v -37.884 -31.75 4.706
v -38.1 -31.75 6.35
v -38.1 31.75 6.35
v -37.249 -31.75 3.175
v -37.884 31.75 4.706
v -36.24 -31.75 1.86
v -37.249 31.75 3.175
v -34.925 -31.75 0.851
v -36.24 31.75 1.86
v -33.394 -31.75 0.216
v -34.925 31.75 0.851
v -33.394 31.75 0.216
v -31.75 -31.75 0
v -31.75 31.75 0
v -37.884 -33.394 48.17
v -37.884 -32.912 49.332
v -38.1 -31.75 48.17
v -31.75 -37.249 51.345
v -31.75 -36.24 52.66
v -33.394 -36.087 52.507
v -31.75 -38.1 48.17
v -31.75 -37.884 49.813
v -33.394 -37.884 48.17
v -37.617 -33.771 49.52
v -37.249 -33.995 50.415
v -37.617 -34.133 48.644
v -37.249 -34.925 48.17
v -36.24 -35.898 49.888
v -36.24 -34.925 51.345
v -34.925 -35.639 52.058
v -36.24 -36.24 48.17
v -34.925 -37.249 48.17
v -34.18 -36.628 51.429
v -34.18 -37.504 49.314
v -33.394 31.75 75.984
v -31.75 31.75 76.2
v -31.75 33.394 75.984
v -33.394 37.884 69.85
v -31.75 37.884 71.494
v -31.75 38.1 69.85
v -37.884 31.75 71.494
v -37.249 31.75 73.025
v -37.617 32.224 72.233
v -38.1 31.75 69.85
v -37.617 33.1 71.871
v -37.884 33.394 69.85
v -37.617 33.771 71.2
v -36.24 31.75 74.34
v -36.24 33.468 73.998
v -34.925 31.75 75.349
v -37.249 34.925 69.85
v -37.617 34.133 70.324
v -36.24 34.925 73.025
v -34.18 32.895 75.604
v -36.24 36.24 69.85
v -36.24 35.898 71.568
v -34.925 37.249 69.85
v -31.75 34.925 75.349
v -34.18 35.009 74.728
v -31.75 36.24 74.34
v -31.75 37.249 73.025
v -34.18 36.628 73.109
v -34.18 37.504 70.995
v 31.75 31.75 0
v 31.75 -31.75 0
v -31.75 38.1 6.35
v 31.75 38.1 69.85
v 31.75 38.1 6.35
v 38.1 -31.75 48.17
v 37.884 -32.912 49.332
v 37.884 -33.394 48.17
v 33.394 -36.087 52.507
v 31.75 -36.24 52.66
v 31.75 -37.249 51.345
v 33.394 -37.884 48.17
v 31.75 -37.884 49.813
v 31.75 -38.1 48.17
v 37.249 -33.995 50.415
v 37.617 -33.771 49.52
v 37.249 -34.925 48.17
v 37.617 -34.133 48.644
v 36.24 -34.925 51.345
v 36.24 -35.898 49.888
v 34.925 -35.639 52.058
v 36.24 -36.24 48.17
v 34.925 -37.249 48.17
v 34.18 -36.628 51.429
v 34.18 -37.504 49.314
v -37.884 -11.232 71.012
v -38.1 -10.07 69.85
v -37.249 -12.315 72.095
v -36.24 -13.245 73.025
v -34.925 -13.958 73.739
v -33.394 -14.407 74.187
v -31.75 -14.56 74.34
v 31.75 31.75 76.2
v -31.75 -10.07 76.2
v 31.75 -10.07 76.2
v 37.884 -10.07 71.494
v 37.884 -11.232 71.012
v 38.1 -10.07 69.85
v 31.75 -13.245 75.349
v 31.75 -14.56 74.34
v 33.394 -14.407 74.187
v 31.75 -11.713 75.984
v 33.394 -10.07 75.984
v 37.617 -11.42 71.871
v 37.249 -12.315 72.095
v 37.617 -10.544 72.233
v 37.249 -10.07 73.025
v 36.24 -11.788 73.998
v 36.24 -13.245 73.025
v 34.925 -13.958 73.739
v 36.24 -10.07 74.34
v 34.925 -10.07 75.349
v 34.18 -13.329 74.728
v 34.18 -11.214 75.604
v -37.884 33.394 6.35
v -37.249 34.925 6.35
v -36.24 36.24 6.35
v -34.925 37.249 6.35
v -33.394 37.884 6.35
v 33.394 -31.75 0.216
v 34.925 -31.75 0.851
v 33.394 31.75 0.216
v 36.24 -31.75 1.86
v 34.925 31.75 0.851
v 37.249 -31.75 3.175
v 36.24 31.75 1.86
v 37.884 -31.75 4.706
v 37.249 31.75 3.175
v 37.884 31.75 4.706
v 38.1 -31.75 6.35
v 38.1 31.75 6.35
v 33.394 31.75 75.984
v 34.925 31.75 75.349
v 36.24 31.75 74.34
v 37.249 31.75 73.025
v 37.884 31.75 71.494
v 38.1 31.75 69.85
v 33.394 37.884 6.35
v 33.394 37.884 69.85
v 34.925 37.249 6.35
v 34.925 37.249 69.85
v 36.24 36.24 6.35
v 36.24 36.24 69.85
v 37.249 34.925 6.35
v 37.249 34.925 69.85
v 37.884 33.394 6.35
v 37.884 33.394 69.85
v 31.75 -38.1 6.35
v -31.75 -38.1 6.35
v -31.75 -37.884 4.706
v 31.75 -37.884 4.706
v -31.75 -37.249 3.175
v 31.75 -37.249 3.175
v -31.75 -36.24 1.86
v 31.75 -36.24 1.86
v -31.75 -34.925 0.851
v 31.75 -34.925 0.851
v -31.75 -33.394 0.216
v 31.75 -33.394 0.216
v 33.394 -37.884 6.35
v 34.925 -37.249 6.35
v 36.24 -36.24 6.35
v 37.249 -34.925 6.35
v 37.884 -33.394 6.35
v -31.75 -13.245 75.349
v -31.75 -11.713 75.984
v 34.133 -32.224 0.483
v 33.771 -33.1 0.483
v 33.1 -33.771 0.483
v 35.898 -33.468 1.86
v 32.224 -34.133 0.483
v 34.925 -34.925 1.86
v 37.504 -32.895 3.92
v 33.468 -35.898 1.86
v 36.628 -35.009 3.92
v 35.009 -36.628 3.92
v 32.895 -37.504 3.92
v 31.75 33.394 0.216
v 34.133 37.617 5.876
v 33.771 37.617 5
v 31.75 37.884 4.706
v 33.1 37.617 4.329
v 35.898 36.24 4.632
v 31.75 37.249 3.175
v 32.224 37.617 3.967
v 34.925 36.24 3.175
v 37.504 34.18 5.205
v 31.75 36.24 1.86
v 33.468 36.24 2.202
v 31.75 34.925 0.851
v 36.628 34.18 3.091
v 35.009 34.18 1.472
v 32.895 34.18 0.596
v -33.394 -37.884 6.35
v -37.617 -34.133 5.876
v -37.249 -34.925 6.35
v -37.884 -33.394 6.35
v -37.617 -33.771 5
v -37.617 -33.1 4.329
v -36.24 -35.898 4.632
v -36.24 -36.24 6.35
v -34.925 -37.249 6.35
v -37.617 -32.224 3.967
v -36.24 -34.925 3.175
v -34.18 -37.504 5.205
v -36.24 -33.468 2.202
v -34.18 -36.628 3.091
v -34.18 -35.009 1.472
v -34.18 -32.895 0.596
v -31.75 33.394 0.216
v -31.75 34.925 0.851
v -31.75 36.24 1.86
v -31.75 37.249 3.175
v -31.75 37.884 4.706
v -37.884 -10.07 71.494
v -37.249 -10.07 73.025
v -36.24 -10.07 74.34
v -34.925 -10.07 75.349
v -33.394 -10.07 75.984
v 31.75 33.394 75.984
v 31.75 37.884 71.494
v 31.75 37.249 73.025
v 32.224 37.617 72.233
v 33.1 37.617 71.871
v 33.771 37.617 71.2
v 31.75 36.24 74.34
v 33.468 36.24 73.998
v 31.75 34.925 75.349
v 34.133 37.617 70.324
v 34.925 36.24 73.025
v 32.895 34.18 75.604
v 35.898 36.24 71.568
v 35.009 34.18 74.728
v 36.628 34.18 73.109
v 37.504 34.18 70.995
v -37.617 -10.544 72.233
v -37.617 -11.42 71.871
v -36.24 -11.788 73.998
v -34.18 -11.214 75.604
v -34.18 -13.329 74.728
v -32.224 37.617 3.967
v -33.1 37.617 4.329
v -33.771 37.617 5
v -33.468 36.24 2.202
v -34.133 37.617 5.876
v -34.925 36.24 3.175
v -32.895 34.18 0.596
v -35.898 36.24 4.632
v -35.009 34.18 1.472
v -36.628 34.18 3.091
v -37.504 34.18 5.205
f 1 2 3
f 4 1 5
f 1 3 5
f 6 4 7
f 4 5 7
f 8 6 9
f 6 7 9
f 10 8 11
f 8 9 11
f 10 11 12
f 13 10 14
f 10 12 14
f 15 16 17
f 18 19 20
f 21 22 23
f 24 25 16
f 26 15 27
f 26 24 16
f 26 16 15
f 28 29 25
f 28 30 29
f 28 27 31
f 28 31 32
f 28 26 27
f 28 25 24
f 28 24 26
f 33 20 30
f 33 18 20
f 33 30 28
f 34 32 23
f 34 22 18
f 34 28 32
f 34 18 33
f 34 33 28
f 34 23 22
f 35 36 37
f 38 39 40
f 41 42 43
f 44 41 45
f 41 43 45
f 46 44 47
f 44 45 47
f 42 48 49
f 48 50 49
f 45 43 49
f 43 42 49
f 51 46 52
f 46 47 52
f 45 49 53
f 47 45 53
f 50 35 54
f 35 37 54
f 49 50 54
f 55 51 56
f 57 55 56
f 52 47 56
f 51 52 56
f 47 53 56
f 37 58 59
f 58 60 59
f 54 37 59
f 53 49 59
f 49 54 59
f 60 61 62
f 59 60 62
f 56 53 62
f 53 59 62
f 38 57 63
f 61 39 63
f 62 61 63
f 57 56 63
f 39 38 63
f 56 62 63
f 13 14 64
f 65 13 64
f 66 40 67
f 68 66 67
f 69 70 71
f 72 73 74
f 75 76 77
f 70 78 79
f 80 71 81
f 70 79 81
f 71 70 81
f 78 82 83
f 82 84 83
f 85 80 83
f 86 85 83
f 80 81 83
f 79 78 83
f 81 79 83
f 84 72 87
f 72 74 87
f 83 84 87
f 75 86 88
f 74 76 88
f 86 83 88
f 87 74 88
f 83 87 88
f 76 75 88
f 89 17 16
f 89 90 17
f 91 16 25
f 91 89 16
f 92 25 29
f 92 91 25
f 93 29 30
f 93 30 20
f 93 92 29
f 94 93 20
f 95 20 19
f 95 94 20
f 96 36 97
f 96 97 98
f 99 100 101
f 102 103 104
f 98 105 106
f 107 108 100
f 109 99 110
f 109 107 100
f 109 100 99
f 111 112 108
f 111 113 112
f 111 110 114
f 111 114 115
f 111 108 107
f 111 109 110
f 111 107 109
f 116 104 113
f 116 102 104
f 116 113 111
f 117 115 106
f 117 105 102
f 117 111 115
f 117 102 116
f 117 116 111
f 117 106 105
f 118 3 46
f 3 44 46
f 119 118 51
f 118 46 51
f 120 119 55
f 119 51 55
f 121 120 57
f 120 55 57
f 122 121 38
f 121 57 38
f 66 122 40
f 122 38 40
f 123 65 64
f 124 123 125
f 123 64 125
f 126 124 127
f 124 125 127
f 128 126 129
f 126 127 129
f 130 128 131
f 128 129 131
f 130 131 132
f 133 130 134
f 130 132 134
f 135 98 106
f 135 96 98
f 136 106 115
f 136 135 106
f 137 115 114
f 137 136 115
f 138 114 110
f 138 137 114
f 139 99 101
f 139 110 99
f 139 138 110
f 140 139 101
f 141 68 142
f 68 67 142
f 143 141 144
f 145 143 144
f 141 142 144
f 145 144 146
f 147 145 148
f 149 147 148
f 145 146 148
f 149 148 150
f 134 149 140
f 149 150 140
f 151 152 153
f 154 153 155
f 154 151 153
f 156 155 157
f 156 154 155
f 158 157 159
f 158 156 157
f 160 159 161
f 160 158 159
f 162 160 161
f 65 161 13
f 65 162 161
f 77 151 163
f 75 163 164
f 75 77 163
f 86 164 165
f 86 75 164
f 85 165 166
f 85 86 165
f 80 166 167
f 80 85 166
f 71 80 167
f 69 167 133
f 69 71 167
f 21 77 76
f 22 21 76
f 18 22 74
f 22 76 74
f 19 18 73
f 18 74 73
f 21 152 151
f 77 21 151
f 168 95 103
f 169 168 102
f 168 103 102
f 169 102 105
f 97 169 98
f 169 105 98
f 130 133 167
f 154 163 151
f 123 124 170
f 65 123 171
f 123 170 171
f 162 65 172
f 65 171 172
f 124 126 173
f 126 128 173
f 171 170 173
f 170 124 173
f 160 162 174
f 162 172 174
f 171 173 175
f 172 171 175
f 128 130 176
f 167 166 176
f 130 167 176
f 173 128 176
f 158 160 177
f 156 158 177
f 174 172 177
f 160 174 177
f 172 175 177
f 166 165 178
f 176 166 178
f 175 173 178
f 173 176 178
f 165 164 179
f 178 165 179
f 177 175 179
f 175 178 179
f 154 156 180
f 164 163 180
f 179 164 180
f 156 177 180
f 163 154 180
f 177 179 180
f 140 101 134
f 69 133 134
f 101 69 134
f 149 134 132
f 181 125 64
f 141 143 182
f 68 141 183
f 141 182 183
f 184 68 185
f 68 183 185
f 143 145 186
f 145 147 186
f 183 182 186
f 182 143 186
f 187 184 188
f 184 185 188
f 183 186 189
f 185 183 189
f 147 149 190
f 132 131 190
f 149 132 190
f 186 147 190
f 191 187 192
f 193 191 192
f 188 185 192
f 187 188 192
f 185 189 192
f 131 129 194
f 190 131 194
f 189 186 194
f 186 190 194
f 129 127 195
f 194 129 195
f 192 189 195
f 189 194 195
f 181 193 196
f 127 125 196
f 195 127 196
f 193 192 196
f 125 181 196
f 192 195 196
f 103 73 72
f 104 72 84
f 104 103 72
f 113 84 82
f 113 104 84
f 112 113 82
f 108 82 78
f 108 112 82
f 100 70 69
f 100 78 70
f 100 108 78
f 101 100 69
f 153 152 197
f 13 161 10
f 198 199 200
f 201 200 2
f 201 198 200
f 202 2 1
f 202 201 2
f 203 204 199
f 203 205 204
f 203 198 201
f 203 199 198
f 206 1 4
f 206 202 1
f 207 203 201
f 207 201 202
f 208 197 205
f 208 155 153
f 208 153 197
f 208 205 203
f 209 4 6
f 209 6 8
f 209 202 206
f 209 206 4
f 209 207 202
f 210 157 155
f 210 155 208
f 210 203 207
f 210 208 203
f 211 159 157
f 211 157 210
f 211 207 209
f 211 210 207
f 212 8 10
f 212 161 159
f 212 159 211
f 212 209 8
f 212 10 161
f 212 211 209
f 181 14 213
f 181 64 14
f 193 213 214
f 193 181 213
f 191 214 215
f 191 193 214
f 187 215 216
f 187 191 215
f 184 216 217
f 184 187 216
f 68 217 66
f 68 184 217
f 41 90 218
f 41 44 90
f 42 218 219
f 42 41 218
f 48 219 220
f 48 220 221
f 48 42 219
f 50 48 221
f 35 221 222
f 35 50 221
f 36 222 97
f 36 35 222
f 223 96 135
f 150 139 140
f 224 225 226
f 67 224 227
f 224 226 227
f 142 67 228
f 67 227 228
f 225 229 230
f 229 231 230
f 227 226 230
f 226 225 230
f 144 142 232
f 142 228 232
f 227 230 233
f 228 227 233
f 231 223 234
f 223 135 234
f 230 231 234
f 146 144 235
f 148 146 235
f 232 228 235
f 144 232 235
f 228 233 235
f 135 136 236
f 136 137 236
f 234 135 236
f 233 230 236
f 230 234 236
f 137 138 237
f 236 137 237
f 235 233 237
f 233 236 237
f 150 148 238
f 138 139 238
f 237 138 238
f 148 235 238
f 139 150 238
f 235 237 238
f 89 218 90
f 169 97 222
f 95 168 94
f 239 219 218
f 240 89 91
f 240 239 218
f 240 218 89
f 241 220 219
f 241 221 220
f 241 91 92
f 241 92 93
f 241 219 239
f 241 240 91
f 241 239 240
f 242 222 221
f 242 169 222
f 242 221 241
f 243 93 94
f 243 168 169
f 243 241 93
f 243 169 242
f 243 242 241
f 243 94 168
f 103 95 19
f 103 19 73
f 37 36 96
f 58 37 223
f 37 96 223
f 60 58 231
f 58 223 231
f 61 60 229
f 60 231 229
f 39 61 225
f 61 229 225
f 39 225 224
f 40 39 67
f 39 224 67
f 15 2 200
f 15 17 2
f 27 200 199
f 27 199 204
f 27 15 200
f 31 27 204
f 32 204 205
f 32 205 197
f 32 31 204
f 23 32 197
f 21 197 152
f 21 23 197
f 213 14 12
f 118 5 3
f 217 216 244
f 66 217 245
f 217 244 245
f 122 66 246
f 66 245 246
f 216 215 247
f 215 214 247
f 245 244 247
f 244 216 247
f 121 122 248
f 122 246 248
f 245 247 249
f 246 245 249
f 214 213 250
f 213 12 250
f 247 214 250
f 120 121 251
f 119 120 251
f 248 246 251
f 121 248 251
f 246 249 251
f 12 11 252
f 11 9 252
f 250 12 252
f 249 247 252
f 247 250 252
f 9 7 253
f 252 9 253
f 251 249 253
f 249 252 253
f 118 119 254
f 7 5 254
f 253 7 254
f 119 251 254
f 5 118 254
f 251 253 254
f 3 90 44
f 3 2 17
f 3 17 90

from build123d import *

# Parameters (mm, degrees)
F0_W     = 76.2
F0_H     = 76.2
F1_DEPTH = 76.2
F2_SIZE  = 25.4
F3_R     = 6.35


with BuildPart() as f1:
    # F0 (on Top) → F1 (new body)
    with BuildSketch(Plane.XY):
        Rectangle(F0_W, F0_H)
    extrude(amount=F1_DEPTH)

    # F2
    f2_edges = [f1.edges().sort_by_distance(p)[0] for p in [
        (0, -38.1, 76.2),
    ]]
    chamfer(f2_edges, length=F2_SIZE)

    # F3
    f3_edges = [f1.edges().sort_by_distance(p)[0] for p in [
        (38.1, 12.7, 76.2),
        (0, 38.1, 76.2),
        (0, -12.7, 76.2),
        (-38.1, 12.7, 76.2),
        (38.1, -38.1, 25.4),
        (38.1, 0, 0),
        (38.1, 38.1, 38.1),
        (0, -38.1, 50.8),
        (38.1, -25.4, 63.5),
        (-38.1, -25.4, 63.5),
        (0, -38.1, 0),
        (-38.1, -38.1, 25.4),
        (-38.1, 0, 0),
        (0, 38.1, 0),
        (-38.1, 38.1, 38.1),
    ]]
    fillet(f3_edges, radius=F3_R)


solid = f1.part
